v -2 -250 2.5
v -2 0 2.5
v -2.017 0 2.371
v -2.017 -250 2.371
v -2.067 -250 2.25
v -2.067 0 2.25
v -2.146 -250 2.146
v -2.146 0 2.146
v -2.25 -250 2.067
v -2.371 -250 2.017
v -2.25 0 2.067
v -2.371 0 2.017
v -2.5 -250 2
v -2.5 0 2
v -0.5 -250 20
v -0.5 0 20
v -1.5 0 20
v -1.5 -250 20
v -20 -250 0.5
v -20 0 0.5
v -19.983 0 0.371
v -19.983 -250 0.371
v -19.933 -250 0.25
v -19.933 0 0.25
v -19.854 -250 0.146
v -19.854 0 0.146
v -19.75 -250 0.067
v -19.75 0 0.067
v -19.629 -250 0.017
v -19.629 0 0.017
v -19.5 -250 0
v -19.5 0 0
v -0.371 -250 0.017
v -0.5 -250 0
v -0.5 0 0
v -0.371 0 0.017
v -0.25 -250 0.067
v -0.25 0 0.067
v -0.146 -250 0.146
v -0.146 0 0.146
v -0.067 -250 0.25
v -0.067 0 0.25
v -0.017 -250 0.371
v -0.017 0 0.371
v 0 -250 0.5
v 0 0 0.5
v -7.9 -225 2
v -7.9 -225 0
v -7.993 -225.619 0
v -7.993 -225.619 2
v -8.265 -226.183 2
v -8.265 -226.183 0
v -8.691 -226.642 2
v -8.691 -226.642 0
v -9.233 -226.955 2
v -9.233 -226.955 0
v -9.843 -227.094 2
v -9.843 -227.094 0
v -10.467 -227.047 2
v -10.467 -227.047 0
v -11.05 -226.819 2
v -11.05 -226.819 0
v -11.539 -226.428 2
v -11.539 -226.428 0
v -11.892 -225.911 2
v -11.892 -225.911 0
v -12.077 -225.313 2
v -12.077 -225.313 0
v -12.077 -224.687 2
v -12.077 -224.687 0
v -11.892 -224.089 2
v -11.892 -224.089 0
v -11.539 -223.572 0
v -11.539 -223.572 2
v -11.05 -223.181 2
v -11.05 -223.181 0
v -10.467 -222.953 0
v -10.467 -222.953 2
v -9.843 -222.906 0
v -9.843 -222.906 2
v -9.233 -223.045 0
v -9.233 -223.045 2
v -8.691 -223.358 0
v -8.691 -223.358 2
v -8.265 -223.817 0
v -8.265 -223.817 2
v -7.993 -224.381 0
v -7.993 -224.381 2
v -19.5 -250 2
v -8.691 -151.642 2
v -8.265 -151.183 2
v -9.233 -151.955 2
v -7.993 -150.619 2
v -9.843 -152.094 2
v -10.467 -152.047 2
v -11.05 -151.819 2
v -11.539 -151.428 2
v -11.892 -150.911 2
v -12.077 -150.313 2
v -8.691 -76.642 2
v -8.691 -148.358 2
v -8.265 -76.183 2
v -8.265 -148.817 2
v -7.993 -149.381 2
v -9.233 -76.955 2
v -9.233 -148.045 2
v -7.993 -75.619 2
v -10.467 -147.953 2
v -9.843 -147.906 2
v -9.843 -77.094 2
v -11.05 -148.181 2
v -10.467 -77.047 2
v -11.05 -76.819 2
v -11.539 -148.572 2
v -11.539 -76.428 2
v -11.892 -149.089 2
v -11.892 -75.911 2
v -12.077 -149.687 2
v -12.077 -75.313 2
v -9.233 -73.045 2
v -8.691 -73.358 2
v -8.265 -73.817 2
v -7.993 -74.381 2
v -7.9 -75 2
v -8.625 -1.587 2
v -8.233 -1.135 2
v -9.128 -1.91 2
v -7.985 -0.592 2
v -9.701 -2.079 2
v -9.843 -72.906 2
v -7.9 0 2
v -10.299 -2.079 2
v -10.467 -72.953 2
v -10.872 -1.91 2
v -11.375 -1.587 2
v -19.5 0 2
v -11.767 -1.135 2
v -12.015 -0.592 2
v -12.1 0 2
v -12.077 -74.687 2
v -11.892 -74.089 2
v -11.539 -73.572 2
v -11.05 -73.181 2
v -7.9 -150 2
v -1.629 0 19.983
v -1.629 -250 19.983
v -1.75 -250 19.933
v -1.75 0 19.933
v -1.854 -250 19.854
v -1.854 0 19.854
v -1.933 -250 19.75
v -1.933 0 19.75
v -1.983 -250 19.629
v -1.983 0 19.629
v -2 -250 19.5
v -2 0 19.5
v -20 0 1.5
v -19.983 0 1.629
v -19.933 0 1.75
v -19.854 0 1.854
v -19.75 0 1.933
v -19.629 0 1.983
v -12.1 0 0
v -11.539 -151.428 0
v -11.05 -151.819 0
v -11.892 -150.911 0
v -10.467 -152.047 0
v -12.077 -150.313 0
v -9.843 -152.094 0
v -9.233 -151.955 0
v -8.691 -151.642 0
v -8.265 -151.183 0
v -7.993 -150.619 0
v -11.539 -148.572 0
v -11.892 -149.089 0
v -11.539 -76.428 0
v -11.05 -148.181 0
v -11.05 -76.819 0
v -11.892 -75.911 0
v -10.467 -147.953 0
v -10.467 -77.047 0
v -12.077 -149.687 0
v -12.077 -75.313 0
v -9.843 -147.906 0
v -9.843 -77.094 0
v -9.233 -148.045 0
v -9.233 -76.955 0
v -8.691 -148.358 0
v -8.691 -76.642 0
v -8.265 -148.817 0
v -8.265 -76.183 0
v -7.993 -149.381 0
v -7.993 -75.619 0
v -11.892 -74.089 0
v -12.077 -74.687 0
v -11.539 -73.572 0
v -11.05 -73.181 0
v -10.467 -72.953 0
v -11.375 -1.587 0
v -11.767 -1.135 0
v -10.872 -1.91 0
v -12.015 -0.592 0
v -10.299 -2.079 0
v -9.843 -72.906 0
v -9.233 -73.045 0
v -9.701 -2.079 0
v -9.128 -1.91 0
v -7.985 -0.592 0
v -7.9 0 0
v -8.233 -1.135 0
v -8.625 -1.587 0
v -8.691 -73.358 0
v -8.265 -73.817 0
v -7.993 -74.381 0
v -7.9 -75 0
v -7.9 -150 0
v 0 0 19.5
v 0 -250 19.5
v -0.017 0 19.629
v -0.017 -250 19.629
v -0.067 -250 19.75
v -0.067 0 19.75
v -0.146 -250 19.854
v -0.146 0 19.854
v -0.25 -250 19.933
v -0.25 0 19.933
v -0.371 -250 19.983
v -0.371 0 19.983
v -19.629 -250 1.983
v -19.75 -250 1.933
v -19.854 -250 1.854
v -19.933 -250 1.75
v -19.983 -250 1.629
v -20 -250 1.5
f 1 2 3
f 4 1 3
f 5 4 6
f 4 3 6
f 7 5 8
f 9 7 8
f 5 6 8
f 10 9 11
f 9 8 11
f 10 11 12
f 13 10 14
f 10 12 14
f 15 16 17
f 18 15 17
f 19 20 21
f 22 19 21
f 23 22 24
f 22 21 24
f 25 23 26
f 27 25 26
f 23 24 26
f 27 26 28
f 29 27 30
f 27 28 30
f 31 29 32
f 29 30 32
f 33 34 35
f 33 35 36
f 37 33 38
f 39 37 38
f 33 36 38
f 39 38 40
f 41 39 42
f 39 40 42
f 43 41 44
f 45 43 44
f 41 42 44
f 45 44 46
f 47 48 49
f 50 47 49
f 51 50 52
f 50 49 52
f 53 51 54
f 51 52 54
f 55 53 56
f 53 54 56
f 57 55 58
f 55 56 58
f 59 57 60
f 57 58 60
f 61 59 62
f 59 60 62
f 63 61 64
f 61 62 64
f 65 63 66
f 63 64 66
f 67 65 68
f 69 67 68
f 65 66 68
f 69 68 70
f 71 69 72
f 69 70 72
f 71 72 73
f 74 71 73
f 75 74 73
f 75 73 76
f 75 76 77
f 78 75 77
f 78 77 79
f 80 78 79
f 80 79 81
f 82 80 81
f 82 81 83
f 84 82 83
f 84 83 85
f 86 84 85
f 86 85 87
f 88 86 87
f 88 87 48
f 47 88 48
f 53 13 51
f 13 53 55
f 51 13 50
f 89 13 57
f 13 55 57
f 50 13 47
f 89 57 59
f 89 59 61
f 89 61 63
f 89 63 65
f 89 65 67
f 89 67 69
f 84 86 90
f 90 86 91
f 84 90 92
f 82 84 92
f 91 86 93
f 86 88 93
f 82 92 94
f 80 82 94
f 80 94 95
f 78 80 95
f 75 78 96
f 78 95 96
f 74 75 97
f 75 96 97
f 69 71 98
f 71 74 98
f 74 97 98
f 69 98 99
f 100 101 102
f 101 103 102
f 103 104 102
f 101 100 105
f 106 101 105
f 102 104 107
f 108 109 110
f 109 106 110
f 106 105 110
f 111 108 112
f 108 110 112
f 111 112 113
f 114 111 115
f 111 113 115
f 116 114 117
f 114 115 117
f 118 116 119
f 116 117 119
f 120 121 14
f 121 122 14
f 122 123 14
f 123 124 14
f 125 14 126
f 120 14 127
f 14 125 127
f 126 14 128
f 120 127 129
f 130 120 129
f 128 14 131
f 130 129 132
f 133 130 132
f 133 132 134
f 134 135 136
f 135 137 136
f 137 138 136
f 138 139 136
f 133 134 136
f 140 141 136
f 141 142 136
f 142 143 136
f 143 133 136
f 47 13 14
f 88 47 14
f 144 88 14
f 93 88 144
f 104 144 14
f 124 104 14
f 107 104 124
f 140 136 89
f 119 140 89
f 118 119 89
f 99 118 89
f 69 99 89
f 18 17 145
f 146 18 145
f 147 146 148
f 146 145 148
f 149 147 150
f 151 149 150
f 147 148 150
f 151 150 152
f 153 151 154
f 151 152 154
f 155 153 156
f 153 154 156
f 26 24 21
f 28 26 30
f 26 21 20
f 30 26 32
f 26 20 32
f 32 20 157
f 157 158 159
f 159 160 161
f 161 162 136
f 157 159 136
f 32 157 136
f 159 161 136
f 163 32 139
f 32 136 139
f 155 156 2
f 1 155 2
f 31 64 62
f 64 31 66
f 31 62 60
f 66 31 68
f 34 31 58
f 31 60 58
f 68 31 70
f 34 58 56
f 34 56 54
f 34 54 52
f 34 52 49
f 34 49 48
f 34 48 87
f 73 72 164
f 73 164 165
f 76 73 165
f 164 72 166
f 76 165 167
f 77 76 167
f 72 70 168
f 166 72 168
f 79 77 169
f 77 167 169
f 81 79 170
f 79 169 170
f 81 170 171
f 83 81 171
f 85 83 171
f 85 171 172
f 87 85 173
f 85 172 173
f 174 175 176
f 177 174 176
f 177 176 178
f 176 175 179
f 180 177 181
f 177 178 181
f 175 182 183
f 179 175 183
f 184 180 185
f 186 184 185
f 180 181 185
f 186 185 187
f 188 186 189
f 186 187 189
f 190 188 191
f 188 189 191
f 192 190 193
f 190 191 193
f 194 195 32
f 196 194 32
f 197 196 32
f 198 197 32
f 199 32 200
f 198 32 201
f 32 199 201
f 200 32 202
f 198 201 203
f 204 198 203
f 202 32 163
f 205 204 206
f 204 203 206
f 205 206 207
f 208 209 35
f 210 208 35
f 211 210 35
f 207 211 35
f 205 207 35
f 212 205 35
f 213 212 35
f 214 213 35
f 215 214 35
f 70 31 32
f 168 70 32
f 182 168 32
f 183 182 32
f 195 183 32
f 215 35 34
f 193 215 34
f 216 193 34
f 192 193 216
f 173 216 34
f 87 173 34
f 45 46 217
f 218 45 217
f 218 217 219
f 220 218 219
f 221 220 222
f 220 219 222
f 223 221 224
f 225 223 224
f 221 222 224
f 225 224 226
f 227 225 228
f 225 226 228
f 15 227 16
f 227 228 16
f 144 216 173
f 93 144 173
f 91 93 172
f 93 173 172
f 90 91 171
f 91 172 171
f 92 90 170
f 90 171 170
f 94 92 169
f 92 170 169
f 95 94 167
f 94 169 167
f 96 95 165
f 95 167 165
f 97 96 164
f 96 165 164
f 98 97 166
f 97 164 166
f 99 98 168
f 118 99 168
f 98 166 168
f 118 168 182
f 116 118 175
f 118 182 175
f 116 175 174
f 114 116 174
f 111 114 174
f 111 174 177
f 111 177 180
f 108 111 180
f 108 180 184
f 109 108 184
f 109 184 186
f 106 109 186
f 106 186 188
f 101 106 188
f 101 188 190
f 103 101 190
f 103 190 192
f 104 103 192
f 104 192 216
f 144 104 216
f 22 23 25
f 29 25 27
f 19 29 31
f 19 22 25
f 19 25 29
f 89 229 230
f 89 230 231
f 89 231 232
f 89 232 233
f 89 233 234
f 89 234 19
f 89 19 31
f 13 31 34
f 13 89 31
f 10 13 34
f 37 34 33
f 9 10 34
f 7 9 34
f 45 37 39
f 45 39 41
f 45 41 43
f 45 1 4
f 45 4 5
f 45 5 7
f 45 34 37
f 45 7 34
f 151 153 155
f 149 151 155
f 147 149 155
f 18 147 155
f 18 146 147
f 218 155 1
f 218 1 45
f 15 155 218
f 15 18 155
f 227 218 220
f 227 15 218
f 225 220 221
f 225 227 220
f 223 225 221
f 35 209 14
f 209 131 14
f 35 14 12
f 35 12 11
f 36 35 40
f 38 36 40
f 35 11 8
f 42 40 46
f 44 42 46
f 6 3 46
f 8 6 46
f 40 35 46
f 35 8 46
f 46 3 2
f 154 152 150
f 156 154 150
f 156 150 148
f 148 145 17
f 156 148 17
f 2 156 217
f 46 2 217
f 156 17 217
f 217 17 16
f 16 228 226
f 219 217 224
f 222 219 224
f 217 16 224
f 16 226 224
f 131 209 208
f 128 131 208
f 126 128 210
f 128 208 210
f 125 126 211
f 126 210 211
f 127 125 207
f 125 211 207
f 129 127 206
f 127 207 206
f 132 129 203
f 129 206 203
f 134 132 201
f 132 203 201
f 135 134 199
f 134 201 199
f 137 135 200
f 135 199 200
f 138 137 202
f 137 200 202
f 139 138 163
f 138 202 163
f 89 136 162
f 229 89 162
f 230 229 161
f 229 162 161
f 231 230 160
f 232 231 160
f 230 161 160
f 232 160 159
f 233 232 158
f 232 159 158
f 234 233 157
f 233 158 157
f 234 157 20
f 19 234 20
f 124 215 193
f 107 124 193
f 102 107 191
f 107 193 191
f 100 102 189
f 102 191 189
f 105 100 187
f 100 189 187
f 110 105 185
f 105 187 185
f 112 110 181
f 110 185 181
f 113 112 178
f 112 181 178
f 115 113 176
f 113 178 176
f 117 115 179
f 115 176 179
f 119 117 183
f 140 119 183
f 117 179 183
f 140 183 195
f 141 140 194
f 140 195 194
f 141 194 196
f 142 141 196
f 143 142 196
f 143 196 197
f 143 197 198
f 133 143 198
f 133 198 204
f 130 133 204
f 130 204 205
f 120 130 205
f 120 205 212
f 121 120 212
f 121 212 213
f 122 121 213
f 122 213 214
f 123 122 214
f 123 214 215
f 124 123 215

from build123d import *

# Parameters (mm, degrees)
F1_DEPTH = 250
F2_R     = 2.1
F3_DEPTH = 25


with BuildPart() as f1:
    # F0 (on Front) → F1 (new body)
    with BuildSketch(Plane.XZ):
        with BuildLine():
            ThreePointArc((-0.5, 0), (-0.146447, 0.146447), (0, 0.5))
            Line((0, 0.5), (0, 19.5))
            ThreePointArc((0, 19.5), (-0.146447, 19.853553), (-0.5, 20))
            Line((-0.5, 20), (-1.5, 20))
            ThreePointArc((-1.5, 20), (-1.853553, 19.853553), (-2, 19.5))
            Line((-2, 19.5), (-2, 2.5))
            ThreePointArc((-2, 2.5), (-2.146447, 2.146447), (-2.5, 2))
            Line((-2.5, 2), (-19.5, 2))
            ThreePointArc((-19.5, 2), (-19.853553, 1.853553), (-20, 1.5))
            Line((-20, 1.5), (-20, 0.5))
            ThreePointArc((-20, 0.5), (-19.853553, 0.146447), (-19.5, 0))
            Line((-19.5, 0), (-0.5, 0))
        make_face()
    extrude(amount=F1_DEPTH)

    # F2 (on face) → F3 (cut)
    with BuildSketch(Plane(origin=(0, 0, 0), x_dir=(1, 0, 0), z_dir=(0, 0, -1))):
        with Locations((-10, 225)):
            Circle(F2_R)
        with Locations((-10, 150)):
            Circle(F2_R)
        with Locations((-10, 75)):
            Circle(F2_R)
        with Locations((-10, 0)):
            Circle(F2_R)
        with Locations((-10, -75)):
            Circle(F2_R)
    extrude(amount=-F3_DEPTH, mode=Mode.SUBTRACT)


solid = f1.part
